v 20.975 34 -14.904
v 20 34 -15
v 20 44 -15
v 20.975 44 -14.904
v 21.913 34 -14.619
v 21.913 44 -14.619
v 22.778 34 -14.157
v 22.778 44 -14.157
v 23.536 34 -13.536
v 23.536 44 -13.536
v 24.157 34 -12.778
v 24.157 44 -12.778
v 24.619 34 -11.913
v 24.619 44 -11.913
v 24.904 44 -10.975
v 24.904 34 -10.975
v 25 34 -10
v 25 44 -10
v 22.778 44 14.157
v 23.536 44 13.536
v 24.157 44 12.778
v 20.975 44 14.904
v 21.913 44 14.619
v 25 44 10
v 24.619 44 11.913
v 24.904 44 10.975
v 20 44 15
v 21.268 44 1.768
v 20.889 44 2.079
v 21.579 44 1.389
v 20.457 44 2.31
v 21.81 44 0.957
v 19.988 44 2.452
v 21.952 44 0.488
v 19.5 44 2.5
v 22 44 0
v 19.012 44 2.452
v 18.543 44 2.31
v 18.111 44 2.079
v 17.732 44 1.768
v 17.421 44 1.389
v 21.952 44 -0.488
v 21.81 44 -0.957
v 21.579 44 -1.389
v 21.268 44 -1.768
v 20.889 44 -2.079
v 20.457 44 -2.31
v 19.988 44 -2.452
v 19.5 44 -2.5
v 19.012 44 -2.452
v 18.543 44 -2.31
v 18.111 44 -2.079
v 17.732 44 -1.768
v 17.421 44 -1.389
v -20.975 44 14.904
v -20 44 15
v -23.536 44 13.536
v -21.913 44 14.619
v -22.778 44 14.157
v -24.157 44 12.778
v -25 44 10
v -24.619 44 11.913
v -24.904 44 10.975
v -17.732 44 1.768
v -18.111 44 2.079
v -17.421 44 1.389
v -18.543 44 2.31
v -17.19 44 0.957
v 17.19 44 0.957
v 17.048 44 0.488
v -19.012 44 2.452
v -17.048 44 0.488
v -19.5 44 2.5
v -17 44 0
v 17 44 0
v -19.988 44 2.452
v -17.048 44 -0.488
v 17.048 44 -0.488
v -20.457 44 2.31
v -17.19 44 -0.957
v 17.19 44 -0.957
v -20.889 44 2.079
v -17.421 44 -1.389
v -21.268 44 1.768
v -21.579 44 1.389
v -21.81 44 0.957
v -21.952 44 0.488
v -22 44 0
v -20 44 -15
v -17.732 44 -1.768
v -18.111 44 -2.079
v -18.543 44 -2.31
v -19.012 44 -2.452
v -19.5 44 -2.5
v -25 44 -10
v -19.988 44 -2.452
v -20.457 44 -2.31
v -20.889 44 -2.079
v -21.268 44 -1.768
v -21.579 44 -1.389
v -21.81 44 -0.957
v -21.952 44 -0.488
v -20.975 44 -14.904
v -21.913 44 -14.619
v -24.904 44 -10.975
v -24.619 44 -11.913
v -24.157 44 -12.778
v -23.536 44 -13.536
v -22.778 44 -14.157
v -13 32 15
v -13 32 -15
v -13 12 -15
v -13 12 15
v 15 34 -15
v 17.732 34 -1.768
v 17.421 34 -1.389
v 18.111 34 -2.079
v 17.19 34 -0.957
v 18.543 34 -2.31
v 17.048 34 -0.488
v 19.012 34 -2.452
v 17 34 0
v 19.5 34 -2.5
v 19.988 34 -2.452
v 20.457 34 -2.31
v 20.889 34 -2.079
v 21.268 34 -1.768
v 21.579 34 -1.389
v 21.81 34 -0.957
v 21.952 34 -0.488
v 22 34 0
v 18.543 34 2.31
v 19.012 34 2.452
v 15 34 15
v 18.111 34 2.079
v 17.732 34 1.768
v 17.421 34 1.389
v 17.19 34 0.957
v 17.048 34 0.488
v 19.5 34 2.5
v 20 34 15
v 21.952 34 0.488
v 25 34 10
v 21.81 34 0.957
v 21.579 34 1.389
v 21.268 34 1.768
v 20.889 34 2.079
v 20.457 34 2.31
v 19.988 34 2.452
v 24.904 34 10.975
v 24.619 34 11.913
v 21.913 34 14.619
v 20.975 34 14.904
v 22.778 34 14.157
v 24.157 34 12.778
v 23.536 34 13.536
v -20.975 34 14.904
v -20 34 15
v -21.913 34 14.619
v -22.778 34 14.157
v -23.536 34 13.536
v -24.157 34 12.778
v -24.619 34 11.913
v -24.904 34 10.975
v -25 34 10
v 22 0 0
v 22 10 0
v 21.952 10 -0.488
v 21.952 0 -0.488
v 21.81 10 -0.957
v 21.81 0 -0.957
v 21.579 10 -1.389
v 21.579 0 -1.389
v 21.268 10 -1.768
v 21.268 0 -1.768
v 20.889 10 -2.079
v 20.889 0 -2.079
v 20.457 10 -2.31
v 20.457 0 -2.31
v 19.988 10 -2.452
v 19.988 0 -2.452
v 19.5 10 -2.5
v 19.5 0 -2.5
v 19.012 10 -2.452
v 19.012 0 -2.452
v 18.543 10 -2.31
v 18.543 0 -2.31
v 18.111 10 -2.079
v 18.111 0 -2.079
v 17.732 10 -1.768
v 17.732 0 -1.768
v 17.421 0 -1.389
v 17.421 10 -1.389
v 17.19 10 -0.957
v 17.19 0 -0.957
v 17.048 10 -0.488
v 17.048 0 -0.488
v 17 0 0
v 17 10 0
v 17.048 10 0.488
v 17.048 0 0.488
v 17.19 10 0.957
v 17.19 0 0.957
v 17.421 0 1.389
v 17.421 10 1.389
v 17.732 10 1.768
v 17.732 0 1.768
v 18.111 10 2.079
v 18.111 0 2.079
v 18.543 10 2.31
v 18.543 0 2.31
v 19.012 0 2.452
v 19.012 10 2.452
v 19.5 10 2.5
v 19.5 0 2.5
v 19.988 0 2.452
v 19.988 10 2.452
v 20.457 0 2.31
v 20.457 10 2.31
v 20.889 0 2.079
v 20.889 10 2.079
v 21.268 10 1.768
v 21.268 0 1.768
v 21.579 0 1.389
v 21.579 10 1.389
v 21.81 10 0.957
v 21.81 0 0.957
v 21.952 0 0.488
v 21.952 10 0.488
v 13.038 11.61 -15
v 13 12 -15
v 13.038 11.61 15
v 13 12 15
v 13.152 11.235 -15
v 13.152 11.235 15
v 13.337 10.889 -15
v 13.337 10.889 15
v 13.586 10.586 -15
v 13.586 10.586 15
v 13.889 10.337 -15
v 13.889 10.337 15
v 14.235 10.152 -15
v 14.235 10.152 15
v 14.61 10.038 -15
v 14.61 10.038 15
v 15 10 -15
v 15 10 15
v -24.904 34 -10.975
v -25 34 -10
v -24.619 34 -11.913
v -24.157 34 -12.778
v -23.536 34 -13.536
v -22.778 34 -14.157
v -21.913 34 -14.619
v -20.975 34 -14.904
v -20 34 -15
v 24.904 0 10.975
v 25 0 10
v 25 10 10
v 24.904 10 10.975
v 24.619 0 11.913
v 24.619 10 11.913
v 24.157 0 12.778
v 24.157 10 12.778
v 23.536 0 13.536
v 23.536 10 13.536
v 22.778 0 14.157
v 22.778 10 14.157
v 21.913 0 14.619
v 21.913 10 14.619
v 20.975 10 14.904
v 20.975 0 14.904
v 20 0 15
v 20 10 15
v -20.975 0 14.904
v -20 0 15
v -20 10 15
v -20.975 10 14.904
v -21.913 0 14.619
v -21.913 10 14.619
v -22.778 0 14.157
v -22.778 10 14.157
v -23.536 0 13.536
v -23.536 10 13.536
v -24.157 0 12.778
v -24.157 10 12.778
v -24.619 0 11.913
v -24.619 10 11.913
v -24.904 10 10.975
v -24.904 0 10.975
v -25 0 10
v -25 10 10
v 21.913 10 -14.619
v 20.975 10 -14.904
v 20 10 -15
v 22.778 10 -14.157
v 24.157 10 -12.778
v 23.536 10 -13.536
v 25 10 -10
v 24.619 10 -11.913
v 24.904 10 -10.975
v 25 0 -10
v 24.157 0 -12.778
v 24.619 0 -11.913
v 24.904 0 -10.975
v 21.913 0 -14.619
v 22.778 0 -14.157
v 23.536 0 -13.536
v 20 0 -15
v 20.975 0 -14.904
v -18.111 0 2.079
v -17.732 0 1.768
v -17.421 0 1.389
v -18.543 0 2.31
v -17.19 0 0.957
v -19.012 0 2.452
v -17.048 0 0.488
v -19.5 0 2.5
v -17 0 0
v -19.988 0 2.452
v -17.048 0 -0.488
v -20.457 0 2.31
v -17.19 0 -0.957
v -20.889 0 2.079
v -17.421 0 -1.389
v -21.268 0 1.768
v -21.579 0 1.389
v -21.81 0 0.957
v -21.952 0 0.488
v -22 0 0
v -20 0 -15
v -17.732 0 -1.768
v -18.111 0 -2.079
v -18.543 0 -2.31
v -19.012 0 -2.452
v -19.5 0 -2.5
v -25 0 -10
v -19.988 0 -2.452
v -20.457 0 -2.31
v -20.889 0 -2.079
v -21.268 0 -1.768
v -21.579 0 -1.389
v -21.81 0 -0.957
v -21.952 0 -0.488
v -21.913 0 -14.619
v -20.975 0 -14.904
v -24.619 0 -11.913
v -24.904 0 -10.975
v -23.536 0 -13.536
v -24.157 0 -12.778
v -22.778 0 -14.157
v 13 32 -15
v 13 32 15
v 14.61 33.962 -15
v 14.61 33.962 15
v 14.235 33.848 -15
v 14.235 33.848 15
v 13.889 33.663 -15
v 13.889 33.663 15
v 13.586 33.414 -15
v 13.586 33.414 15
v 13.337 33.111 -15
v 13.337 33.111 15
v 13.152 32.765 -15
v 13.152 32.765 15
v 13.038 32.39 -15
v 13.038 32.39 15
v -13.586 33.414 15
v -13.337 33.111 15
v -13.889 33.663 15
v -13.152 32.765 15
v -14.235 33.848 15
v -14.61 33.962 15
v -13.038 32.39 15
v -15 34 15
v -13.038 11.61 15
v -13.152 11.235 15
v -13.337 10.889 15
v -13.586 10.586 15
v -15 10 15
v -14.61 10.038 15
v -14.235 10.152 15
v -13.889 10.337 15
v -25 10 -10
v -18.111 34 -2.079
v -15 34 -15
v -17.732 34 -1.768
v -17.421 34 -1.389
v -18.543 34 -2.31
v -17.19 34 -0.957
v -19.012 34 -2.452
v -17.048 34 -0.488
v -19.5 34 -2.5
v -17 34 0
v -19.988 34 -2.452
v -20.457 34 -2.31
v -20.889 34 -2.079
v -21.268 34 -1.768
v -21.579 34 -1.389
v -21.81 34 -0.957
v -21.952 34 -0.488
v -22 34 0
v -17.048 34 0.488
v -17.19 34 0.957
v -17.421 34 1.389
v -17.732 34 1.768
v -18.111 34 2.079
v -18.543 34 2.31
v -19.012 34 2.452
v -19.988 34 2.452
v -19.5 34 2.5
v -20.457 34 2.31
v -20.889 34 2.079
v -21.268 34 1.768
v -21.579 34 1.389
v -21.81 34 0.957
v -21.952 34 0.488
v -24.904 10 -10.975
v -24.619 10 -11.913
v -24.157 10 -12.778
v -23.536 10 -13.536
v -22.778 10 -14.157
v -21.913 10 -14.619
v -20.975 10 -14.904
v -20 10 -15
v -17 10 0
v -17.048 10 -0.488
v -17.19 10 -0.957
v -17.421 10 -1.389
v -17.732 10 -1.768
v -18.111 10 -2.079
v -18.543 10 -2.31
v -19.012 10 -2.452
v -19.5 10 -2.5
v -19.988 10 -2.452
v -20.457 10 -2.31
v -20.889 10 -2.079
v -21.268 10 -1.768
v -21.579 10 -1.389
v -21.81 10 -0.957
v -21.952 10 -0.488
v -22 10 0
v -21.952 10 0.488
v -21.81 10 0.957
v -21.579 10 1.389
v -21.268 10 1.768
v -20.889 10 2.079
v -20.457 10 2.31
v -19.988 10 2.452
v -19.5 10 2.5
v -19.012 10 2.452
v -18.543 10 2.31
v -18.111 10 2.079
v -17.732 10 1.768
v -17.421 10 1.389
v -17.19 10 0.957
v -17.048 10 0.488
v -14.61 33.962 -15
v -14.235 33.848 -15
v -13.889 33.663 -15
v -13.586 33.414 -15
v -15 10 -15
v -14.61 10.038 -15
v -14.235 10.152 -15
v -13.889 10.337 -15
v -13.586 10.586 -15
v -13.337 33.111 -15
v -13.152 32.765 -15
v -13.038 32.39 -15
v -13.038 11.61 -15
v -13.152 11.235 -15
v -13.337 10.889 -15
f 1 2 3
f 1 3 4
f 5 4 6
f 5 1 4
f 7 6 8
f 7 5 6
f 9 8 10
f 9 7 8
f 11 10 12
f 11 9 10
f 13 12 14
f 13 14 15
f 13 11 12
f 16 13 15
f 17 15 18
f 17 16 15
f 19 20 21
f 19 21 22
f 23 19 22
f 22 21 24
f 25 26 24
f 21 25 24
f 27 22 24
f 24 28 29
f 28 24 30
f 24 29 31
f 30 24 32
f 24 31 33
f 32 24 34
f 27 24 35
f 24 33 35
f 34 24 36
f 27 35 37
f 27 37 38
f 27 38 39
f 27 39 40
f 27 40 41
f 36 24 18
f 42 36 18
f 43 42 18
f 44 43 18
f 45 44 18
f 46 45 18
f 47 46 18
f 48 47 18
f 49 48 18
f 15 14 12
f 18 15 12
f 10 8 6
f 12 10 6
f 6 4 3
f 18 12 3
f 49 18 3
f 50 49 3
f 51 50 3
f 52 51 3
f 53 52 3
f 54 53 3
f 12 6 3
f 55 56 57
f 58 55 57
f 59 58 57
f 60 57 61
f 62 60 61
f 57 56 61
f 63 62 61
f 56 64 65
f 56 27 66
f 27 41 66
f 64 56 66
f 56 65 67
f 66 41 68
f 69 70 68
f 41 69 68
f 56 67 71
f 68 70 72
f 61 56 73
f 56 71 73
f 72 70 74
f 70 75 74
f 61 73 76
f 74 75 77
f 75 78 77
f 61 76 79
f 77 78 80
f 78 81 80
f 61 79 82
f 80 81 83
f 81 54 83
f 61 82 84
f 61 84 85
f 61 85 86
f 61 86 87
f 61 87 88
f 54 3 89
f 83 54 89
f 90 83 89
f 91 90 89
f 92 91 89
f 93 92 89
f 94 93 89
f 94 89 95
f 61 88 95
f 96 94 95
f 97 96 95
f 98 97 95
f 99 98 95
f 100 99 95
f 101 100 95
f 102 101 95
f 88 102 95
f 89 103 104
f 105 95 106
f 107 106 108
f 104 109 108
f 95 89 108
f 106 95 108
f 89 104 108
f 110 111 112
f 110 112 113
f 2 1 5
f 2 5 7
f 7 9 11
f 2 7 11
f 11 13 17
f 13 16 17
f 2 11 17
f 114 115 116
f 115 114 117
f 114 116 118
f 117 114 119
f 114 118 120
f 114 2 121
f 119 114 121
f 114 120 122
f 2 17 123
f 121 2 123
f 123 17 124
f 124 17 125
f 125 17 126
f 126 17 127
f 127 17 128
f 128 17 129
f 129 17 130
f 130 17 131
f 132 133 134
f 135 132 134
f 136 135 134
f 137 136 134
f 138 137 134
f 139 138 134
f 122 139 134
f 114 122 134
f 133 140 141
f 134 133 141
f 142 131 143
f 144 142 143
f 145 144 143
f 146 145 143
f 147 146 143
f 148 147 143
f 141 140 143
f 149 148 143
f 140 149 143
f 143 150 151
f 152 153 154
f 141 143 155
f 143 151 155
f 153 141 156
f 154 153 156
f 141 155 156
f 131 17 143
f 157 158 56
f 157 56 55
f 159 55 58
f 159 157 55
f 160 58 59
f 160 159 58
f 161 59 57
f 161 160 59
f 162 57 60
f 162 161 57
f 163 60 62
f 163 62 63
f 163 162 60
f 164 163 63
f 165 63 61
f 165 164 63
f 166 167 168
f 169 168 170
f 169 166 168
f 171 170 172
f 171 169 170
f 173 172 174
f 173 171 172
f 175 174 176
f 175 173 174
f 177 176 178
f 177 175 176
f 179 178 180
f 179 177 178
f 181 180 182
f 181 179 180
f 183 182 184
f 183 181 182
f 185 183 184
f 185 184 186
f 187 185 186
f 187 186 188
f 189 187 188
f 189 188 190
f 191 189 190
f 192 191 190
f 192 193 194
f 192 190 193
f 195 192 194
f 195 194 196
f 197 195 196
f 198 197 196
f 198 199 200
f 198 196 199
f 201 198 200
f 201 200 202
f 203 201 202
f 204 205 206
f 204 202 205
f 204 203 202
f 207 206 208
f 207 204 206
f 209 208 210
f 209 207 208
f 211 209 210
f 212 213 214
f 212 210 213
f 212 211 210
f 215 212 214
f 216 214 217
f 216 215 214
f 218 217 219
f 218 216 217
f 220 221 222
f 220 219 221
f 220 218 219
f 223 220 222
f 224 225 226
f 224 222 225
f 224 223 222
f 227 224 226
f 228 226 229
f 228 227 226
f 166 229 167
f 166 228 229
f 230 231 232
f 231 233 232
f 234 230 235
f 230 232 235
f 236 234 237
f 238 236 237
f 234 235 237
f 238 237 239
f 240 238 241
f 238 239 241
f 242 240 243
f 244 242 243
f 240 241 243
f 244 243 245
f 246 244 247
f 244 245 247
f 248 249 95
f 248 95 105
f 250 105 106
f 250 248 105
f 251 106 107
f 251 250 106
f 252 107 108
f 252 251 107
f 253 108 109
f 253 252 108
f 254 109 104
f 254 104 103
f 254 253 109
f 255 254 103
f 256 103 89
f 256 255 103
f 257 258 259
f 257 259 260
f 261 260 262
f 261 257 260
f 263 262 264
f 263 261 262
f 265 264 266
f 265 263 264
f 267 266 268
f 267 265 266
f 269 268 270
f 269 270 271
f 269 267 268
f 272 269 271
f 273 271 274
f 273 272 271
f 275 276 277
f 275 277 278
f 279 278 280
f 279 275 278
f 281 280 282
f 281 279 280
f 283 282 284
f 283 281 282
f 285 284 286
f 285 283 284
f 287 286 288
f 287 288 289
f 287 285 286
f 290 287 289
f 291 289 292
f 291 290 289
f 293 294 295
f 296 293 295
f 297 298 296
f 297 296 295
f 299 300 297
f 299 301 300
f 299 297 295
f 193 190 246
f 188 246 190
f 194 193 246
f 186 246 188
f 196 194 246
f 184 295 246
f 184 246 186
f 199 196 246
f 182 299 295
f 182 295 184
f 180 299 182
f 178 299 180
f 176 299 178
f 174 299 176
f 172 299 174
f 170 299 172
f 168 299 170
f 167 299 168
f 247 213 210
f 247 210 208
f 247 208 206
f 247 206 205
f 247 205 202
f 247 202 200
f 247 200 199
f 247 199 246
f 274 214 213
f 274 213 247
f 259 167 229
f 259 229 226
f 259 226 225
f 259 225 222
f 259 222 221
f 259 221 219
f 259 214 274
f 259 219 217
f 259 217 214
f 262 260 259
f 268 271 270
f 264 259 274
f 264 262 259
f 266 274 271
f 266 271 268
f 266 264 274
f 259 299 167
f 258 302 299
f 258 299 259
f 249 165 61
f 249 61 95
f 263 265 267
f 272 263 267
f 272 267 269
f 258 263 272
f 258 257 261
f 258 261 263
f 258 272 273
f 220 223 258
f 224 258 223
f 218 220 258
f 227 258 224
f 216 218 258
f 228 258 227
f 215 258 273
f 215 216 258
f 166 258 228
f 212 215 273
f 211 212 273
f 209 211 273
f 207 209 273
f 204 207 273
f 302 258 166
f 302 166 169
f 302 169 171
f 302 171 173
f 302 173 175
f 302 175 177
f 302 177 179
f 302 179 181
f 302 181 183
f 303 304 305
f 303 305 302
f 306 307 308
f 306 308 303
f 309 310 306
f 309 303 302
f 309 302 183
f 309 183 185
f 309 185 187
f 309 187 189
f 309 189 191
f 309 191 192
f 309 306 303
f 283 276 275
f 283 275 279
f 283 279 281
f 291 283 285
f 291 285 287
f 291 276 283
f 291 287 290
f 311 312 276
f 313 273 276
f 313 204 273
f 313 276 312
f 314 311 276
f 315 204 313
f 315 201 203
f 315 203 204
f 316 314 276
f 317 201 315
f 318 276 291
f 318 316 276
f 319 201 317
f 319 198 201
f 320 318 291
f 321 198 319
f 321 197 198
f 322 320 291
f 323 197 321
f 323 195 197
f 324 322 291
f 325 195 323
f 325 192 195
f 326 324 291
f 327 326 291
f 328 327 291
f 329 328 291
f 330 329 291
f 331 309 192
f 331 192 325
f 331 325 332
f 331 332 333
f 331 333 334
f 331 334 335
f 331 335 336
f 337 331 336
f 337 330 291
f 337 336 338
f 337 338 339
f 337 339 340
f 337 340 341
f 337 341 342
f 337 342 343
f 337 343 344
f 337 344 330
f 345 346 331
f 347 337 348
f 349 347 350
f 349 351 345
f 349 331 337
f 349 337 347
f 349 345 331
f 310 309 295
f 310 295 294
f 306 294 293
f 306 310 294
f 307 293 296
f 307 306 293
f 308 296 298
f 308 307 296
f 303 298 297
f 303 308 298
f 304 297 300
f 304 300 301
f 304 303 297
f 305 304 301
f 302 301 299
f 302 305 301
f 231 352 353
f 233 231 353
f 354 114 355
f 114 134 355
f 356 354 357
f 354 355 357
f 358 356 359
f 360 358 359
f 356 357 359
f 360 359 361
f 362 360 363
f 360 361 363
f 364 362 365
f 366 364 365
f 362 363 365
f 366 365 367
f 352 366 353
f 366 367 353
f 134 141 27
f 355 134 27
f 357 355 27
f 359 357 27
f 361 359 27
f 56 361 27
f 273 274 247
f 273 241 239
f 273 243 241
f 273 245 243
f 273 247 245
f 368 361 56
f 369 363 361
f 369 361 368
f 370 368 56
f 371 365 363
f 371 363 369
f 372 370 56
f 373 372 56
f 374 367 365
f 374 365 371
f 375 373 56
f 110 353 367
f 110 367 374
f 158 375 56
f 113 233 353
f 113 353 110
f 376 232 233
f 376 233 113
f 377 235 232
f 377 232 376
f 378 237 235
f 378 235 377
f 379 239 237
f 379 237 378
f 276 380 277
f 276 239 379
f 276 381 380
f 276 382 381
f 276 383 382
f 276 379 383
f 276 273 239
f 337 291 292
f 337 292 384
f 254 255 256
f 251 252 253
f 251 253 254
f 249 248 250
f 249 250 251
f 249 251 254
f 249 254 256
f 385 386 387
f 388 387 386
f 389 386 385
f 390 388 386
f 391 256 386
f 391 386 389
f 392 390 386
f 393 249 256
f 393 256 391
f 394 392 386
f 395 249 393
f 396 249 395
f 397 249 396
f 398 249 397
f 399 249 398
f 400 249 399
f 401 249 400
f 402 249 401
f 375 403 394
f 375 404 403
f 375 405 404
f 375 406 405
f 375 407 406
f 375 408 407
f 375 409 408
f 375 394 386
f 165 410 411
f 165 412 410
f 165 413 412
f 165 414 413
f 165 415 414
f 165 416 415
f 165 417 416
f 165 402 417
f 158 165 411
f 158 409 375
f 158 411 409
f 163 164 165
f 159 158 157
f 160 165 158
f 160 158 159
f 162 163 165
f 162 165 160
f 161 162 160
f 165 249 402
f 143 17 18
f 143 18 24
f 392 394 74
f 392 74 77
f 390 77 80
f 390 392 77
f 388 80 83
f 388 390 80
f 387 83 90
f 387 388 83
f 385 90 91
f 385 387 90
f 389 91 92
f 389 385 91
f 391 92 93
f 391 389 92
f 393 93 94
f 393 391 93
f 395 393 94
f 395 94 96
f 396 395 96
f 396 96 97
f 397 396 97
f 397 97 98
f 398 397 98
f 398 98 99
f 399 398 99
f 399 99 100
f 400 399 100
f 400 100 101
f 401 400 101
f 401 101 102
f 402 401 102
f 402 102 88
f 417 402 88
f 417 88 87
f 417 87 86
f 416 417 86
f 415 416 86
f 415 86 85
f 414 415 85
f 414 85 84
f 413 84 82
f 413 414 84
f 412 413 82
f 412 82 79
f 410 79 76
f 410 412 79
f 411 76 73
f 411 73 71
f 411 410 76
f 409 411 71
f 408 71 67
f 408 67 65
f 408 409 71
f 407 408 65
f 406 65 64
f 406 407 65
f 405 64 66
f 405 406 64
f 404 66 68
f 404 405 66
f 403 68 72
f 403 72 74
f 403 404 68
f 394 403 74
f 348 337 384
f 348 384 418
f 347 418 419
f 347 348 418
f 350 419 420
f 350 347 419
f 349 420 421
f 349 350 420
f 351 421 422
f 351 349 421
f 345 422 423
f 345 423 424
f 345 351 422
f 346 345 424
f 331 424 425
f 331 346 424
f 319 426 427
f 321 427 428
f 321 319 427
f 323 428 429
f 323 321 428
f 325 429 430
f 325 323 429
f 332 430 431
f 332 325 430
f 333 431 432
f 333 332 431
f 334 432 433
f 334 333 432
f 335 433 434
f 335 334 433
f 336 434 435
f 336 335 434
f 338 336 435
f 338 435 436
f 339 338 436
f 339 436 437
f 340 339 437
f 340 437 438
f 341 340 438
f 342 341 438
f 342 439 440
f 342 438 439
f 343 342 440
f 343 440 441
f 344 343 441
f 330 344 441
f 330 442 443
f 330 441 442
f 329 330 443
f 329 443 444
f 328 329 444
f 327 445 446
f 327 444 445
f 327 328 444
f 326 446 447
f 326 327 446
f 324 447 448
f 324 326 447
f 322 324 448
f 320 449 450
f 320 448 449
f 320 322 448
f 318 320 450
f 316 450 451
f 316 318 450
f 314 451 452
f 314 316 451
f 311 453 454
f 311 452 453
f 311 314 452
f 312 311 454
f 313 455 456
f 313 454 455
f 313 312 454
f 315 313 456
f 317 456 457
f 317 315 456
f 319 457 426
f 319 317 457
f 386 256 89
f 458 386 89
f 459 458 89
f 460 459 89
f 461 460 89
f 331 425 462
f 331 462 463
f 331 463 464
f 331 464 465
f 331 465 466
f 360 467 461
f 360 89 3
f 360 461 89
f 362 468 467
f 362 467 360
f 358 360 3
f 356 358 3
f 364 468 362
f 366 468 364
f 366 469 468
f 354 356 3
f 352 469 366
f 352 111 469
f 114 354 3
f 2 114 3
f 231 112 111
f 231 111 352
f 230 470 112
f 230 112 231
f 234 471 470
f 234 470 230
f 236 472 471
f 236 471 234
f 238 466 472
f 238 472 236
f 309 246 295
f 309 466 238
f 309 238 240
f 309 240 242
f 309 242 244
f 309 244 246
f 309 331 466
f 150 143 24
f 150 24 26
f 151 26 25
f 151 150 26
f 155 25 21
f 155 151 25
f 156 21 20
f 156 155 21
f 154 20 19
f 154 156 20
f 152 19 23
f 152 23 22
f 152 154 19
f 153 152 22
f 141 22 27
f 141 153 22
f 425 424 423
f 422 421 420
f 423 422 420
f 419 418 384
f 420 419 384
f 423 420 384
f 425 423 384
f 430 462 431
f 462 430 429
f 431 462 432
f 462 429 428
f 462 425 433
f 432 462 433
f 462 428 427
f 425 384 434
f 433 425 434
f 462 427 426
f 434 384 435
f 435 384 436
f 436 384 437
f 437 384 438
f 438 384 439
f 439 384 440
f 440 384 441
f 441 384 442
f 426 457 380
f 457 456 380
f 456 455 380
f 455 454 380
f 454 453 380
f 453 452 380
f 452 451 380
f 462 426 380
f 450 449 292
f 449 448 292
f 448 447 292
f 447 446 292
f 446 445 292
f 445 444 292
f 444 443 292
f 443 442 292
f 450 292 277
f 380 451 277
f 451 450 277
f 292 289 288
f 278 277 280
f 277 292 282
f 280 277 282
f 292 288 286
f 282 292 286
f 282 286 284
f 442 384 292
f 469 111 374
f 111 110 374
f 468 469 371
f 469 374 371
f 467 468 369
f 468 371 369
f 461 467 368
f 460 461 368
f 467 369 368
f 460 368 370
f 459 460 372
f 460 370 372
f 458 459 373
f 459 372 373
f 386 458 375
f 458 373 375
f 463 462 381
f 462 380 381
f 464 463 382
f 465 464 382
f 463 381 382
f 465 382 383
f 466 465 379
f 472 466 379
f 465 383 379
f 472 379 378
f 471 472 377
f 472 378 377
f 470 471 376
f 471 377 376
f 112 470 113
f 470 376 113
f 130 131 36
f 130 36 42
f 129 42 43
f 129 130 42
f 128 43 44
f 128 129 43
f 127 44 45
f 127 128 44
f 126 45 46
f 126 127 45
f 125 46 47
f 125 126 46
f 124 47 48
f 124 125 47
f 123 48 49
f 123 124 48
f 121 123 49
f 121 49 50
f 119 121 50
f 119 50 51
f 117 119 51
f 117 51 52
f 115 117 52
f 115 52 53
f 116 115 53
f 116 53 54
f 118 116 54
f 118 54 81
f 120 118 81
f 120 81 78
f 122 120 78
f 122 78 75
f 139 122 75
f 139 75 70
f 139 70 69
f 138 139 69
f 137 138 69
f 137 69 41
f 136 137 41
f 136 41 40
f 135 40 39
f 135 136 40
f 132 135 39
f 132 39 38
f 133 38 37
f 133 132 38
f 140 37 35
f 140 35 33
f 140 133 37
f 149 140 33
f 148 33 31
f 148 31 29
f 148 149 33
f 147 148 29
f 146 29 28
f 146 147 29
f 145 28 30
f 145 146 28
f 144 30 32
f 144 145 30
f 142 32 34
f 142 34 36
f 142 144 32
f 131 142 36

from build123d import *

# Parameters (mm, degrees)
SKETCH1_R           = 2.5
BOSS_EXTRUDE1_DEPTH = 44
SKETCH2_W           = 30
SKETCH2_H           = 24
CUT_EXTRUDE1_DEPTH  = 12
FILLET1_R           = 2


with BuildPart() as part:
    # Sketch1 → Boss-Extrude1 (new body)
    with BuildSketch(Plane(origin=(0, 0, 0), x_dir=(1, 0, 0), z_dir=(0, 1, 0))):
        with BuildLine():
            Line((20, -15), (-20, -15))
            ThreePointArc((-20, -15), (-23.535533906, -13.535533906), (-25, -10))
            Line((-25, -10), (-25, 10))
            ThreePointArc((-25, 10), (-23.535533906, 13.535533906), (-20, 15))
            Line((-20, 15), (20, 15))
            ThreePointArc((20, 15), (23.535533906, 13.535533906), (25, 10))
            Line((25, 10), (25, -10))
            ThreePointArc((25, -10), (23.535533906, -13.535533906), (20, -15))
        make_face()
        with Locations((-19.5, 0)):
            Circle(SKETCH1_R, mode=Mode.SUBTRACT)
        with Locations((19.5, 0)):
            Circle(SKETCH1_R, mode=Mode.SUBTRACT)
    extrude(amount=BOSS_EXTRUDE1_DEPTH)

    # Sketch2 → Cut-Extrude1 (cut)
    with BuildSketch(Plane.ZY.offset(25)):
        with Locations((0, 22)):
            Rectangle(SKETCH2_W, SKETCH2_H)
    cut_extrude1 = extrude(amount=-CUT_EXTRUDE1_DEPTH, mode=Mode.SUBTRACT)

    # Mirror1: Cut-Extrude1 across plane
    add(cut_extrude1.mirror(Plane(origin=(0, 0, 0), x_dir=(0, 0, 1), z_dir=(1, 0, 0))), mode=Mode.SUBTRACT)

    # Fillet1
    fillet1_edges = [part.edges().sort_by_distance(p)[0] for p in [
        (-13, 34, 0),
        (-13, 10, 0),
        (13, 10, 0),
        (13, 34, 0),
    ]]
    fillet(fillet1_edges, radius=FILLET1_R)


solid = part.part
